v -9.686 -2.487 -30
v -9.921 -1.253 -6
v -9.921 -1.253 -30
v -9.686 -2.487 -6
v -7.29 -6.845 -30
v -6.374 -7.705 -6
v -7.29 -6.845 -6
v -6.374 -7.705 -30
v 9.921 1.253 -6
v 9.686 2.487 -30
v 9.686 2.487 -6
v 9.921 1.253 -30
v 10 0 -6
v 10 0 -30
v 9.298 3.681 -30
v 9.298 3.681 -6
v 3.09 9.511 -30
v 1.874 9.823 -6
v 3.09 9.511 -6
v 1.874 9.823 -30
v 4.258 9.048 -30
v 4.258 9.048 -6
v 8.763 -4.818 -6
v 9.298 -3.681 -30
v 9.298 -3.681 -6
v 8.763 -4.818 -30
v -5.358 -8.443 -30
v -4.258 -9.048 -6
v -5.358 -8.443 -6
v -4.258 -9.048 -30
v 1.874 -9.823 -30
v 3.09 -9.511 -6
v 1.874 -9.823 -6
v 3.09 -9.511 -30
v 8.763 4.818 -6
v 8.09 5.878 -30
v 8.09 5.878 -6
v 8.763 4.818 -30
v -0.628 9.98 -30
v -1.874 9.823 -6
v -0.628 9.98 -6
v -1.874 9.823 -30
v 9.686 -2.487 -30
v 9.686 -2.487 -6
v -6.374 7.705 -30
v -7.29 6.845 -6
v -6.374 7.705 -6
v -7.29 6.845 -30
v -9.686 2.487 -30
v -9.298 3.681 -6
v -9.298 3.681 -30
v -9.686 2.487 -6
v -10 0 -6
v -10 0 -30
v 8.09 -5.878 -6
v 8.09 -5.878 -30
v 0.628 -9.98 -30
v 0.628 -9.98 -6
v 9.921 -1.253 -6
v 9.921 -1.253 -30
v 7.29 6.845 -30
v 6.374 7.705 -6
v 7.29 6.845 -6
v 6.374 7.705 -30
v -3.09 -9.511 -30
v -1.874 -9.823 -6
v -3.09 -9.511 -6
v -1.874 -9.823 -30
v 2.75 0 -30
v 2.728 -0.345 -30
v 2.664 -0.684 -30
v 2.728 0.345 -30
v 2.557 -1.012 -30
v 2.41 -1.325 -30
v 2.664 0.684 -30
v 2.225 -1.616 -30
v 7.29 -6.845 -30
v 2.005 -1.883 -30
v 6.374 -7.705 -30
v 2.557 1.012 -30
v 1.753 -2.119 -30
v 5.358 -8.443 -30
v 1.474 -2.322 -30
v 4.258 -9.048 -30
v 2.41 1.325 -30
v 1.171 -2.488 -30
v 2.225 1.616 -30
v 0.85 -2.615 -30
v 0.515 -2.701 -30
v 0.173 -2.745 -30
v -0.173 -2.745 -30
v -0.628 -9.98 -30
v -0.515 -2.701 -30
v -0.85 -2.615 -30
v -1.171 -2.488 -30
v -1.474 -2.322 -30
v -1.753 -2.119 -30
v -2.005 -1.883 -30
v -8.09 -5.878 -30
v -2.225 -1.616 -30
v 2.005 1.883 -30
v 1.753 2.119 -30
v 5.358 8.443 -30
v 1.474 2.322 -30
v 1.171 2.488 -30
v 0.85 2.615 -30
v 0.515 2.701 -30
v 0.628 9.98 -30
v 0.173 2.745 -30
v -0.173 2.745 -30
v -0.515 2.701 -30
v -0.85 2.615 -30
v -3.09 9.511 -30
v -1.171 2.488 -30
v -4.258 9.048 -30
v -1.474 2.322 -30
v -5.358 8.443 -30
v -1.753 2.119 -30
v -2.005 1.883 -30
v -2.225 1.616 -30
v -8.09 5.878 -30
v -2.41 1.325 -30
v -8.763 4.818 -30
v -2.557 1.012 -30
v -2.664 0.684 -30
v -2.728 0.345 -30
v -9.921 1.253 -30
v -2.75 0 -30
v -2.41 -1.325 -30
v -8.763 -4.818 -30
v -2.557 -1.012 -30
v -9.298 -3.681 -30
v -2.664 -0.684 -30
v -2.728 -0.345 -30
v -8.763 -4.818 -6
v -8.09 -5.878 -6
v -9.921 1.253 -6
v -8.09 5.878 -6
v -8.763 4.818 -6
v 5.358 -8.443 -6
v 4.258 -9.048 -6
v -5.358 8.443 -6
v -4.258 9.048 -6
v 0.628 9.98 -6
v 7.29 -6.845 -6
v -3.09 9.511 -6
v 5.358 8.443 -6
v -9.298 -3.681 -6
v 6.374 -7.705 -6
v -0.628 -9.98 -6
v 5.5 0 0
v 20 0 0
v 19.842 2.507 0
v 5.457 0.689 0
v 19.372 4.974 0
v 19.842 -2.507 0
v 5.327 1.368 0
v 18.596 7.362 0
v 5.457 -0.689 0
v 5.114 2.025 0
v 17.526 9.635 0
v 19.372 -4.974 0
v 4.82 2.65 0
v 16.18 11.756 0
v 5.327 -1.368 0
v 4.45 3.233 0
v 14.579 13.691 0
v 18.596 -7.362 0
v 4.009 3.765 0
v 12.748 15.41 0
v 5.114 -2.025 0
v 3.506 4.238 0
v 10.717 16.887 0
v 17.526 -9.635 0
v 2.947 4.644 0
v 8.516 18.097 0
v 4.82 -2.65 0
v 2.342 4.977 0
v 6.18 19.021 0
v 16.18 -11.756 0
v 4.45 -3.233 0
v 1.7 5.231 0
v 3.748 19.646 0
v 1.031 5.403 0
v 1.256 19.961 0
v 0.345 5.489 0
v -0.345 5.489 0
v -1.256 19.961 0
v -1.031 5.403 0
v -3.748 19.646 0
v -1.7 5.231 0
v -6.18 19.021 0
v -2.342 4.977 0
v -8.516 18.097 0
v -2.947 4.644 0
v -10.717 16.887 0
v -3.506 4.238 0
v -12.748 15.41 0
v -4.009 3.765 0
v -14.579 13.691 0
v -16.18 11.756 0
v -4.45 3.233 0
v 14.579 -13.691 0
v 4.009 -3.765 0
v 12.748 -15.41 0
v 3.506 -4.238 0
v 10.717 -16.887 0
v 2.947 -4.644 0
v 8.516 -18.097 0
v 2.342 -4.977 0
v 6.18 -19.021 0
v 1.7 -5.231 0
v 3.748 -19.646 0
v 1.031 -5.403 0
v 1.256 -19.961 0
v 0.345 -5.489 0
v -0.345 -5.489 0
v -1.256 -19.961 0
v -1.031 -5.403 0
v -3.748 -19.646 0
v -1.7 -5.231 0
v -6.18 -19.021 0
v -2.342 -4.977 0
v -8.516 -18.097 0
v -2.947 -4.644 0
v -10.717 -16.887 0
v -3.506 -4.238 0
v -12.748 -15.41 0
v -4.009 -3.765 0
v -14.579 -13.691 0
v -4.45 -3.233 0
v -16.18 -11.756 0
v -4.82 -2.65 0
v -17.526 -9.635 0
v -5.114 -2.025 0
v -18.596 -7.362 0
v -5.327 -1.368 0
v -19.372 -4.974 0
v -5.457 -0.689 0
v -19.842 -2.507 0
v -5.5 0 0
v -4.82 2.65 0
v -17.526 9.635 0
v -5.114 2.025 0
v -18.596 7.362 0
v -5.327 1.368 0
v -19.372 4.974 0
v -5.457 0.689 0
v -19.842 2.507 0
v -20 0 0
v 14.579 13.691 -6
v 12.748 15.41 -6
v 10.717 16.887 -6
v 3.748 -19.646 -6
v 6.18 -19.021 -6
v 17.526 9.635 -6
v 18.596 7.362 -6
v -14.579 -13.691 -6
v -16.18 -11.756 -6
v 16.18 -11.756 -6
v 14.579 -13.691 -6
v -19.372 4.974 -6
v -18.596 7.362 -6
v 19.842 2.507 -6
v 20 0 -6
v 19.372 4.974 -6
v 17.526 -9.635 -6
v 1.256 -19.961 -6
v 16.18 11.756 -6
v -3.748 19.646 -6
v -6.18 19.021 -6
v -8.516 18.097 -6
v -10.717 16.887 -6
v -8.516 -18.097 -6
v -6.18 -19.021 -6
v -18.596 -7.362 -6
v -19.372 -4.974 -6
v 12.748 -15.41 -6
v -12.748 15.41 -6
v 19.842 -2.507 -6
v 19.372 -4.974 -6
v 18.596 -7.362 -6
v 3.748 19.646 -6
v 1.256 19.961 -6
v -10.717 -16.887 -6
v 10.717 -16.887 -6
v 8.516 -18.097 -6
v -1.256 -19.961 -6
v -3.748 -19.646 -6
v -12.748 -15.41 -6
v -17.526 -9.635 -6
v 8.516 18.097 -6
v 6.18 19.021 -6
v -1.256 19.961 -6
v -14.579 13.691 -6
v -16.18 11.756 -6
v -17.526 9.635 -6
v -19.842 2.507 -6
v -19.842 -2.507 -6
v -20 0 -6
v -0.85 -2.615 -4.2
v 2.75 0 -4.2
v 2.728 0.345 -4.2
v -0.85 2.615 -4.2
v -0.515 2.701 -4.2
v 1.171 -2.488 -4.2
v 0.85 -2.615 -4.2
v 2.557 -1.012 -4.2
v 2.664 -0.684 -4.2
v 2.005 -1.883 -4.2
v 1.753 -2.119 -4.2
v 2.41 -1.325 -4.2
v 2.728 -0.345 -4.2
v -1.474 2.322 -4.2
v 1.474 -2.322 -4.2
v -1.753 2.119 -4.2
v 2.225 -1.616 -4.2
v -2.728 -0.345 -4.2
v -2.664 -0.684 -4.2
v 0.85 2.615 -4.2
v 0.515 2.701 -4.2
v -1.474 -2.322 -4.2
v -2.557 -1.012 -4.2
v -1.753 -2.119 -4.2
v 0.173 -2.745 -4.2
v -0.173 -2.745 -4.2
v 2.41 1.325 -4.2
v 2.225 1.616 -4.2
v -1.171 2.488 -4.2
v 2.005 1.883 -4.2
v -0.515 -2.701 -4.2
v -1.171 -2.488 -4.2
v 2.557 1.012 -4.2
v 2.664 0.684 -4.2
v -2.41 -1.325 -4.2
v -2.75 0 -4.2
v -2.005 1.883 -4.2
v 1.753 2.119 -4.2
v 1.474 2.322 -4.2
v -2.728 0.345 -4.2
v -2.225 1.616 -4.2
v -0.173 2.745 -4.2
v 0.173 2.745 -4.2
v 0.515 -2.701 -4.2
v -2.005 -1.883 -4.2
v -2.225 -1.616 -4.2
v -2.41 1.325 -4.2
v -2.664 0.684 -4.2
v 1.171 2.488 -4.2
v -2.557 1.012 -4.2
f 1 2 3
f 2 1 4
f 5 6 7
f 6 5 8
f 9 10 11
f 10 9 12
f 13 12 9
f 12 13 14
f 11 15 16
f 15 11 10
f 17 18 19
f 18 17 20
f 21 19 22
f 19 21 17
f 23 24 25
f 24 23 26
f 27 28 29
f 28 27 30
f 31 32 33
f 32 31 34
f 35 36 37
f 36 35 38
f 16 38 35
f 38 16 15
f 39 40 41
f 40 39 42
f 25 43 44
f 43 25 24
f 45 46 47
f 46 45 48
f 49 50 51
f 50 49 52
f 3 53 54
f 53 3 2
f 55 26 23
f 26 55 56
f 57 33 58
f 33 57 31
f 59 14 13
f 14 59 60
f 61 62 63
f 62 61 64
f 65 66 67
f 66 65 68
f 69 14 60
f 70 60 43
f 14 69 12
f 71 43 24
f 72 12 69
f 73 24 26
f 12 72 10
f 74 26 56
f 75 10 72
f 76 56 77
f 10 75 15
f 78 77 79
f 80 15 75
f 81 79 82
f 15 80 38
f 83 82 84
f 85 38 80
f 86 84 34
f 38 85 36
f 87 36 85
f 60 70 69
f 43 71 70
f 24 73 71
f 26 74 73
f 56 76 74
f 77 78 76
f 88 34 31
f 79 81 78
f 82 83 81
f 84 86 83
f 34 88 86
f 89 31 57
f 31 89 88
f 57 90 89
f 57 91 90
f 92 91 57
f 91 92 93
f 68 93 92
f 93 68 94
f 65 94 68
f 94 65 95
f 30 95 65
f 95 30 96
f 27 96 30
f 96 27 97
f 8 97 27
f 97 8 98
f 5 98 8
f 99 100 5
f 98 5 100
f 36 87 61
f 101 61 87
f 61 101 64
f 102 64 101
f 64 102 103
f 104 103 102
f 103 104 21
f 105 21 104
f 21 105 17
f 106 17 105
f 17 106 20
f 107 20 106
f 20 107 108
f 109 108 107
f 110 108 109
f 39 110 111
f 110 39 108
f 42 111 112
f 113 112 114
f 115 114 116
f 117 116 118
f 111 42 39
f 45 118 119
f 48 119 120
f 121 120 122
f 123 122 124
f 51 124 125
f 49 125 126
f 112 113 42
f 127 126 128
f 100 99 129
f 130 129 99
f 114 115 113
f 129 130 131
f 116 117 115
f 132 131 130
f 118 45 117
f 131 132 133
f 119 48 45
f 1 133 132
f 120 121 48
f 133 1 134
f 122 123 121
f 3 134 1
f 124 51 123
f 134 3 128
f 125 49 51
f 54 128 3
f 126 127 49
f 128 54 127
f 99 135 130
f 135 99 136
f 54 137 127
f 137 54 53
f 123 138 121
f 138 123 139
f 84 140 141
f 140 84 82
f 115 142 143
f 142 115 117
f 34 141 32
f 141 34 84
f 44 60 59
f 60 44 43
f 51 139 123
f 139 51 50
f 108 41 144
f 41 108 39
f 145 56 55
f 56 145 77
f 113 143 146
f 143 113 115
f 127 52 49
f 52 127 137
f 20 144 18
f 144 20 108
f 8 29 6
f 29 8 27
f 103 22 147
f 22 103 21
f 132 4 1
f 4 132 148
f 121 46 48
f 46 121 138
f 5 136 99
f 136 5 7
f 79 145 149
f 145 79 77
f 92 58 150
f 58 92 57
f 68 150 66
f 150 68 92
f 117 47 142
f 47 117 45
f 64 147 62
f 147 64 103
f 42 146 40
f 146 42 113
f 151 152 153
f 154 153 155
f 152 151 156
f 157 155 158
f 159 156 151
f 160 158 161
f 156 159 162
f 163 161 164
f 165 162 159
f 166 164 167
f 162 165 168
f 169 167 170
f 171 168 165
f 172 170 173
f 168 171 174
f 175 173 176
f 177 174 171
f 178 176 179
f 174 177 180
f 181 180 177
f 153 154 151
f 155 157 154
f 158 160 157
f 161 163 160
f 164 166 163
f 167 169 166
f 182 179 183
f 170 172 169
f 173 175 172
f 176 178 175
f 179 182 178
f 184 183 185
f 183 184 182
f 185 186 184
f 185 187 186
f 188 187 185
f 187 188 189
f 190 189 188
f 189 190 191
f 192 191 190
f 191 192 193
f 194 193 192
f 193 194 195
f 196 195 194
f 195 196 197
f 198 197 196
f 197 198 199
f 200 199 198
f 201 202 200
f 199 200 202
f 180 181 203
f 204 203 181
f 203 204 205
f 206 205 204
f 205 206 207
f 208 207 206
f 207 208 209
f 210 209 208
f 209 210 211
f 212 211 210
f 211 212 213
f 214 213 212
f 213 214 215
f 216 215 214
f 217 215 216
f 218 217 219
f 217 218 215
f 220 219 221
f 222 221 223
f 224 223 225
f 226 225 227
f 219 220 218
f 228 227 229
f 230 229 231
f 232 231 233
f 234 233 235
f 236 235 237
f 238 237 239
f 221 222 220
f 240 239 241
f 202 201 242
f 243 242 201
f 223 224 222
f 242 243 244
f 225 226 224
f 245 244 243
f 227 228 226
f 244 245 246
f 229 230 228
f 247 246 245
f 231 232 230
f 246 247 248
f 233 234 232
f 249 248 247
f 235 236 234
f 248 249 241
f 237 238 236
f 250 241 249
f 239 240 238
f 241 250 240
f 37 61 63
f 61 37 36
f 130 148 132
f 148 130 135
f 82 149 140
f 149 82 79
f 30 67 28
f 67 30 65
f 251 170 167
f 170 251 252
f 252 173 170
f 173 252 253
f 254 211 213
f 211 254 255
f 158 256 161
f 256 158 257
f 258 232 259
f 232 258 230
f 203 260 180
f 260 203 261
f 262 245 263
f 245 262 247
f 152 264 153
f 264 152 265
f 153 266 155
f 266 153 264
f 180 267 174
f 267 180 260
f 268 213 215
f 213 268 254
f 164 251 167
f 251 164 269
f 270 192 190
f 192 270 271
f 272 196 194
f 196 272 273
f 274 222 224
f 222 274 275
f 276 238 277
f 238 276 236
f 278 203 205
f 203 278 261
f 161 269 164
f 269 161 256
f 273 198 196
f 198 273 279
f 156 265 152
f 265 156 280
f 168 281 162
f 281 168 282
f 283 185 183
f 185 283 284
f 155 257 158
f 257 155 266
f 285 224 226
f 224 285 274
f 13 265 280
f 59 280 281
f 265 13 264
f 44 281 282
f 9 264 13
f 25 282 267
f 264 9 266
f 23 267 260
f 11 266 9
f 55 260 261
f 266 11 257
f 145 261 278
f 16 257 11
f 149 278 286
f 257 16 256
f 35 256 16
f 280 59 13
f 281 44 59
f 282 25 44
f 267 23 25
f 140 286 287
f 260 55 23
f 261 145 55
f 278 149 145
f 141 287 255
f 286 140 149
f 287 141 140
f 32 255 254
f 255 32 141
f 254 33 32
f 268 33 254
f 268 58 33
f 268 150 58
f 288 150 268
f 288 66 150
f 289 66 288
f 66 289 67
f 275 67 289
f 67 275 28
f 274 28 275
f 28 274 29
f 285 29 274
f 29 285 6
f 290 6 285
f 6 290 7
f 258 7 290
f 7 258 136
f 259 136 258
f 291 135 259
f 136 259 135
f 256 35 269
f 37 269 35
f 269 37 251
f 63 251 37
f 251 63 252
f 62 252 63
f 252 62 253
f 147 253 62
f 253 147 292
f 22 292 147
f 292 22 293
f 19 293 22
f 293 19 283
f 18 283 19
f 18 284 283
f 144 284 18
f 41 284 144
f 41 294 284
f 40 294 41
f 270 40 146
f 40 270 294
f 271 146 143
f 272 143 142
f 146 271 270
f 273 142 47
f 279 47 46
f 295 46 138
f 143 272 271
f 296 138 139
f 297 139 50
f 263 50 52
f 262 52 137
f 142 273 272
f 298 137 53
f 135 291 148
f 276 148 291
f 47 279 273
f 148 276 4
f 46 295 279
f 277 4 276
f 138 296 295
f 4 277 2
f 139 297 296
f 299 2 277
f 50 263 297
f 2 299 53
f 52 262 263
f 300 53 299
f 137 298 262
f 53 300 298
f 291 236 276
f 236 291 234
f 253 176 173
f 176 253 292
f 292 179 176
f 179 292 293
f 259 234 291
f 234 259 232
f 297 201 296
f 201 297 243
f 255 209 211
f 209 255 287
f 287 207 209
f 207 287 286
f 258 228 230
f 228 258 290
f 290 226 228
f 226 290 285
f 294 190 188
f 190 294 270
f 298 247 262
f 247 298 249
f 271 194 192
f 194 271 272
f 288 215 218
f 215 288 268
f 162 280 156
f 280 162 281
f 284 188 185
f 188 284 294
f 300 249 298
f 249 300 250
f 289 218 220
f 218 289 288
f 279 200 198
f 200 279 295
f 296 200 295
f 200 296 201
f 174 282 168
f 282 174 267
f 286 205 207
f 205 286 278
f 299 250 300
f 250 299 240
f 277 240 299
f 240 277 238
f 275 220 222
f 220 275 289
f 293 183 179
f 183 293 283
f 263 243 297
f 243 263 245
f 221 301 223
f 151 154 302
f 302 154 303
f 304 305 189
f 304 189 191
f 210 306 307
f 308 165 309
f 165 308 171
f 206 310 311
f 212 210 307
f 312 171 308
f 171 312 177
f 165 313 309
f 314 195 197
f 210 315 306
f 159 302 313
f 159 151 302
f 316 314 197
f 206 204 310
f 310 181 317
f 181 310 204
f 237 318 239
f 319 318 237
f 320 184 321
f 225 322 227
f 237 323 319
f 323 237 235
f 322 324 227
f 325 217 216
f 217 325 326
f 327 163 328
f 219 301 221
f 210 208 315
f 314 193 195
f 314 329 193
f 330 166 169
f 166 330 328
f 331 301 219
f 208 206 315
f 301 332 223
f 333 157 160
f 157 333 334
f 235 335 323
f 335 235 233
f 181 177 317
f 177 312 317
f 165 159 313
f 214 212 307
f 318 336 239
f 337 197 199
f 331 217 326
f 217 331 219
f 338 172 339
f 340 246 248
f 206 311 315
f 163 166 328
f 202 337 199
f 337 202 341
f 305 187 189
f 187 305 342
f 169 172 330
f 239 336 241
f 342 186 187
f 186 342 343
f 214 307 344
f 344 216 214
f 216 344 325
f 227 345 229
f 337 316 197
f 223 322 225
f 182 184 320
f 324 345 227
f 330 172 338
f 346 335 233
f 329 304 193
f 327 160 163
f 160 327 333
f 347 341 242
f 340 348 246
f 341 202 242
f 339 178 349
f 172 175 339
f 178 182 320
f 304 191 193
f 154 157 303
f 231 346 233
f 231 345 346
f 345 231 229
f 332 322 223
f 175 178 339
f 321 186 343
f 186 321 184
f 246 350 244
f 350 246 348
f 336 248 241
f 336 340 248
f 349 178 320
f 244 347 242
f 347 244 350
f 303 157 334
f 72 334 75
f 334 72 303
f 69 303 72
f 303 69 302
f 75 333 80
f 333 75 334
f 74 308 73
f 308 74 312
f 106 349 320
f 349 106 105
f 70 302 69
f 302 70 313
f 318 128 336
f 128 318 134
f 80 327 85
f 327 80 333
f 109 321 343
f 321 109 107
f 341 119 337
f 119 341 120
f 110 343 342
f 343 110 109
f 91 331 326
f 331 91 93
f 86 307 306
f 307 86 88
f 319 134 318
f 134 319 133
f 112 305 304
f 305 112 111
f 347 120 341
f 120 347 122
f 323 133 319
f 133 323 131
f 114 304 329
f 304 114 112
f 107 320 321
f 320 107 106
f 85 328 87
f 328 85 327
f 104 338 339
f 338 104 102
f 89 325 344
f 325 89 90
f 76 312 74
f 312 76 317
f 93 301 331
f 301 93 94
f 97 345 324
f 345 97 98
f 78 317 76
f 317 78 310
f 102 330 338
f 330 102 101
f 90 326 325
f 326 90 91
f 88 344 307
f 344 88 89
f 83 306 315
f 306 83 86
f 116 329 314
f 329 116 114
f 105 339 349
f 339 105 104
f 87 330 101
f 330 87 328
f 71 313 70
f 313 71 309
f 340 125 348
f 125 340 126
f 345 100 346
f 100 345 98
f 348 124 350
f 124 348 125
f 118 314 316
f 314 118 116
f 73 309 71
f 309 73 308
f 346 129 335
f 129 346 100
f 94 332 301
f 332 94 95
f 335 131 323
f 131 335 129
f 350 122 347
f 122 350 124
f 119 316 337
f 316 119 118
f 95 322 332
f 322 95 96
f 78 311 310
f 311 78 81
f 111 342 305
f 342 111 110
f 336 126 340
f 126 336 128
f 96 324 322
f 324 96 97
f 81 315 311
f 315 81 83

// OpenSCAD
$fn = 50;


difference() {
	union() {
		translate(v = [0, 0, -30.0000000000]) {
			cylinder(h = 30, r = 10.0000000000);
		}
		translate(v = [0, 0, -6.0000000000]) {
			cylinder(h = 6, r = 20.0000000000);
		}
	}
	union() {
		translate(v = [0, 0, 0]) {
			rotate(a = [0, 0, 0]) {
				difference() {
					union() {
						#translate(v = [0, 0, -30.0000000000]) {
							cylinder(h = 30, r = 2.2500000000);
						}
						#translate(v = [0, 0, -4.2000000000]) {
							cylinder(h = 4.2000000000, r1 = 2.7500000000, r2 = 5.5000000000);
						}
						#translate(v = [0, 0, -30.0000000000]) {
							cylinder(h = 30, r = 2.7500000000);
						}
						#translate(v = [0, 0, -30.0000000000]) {
							cylinder(h = 30, r = 2.2500000000);
						}
					}
					union();
				}
			}
		}
	}
}
